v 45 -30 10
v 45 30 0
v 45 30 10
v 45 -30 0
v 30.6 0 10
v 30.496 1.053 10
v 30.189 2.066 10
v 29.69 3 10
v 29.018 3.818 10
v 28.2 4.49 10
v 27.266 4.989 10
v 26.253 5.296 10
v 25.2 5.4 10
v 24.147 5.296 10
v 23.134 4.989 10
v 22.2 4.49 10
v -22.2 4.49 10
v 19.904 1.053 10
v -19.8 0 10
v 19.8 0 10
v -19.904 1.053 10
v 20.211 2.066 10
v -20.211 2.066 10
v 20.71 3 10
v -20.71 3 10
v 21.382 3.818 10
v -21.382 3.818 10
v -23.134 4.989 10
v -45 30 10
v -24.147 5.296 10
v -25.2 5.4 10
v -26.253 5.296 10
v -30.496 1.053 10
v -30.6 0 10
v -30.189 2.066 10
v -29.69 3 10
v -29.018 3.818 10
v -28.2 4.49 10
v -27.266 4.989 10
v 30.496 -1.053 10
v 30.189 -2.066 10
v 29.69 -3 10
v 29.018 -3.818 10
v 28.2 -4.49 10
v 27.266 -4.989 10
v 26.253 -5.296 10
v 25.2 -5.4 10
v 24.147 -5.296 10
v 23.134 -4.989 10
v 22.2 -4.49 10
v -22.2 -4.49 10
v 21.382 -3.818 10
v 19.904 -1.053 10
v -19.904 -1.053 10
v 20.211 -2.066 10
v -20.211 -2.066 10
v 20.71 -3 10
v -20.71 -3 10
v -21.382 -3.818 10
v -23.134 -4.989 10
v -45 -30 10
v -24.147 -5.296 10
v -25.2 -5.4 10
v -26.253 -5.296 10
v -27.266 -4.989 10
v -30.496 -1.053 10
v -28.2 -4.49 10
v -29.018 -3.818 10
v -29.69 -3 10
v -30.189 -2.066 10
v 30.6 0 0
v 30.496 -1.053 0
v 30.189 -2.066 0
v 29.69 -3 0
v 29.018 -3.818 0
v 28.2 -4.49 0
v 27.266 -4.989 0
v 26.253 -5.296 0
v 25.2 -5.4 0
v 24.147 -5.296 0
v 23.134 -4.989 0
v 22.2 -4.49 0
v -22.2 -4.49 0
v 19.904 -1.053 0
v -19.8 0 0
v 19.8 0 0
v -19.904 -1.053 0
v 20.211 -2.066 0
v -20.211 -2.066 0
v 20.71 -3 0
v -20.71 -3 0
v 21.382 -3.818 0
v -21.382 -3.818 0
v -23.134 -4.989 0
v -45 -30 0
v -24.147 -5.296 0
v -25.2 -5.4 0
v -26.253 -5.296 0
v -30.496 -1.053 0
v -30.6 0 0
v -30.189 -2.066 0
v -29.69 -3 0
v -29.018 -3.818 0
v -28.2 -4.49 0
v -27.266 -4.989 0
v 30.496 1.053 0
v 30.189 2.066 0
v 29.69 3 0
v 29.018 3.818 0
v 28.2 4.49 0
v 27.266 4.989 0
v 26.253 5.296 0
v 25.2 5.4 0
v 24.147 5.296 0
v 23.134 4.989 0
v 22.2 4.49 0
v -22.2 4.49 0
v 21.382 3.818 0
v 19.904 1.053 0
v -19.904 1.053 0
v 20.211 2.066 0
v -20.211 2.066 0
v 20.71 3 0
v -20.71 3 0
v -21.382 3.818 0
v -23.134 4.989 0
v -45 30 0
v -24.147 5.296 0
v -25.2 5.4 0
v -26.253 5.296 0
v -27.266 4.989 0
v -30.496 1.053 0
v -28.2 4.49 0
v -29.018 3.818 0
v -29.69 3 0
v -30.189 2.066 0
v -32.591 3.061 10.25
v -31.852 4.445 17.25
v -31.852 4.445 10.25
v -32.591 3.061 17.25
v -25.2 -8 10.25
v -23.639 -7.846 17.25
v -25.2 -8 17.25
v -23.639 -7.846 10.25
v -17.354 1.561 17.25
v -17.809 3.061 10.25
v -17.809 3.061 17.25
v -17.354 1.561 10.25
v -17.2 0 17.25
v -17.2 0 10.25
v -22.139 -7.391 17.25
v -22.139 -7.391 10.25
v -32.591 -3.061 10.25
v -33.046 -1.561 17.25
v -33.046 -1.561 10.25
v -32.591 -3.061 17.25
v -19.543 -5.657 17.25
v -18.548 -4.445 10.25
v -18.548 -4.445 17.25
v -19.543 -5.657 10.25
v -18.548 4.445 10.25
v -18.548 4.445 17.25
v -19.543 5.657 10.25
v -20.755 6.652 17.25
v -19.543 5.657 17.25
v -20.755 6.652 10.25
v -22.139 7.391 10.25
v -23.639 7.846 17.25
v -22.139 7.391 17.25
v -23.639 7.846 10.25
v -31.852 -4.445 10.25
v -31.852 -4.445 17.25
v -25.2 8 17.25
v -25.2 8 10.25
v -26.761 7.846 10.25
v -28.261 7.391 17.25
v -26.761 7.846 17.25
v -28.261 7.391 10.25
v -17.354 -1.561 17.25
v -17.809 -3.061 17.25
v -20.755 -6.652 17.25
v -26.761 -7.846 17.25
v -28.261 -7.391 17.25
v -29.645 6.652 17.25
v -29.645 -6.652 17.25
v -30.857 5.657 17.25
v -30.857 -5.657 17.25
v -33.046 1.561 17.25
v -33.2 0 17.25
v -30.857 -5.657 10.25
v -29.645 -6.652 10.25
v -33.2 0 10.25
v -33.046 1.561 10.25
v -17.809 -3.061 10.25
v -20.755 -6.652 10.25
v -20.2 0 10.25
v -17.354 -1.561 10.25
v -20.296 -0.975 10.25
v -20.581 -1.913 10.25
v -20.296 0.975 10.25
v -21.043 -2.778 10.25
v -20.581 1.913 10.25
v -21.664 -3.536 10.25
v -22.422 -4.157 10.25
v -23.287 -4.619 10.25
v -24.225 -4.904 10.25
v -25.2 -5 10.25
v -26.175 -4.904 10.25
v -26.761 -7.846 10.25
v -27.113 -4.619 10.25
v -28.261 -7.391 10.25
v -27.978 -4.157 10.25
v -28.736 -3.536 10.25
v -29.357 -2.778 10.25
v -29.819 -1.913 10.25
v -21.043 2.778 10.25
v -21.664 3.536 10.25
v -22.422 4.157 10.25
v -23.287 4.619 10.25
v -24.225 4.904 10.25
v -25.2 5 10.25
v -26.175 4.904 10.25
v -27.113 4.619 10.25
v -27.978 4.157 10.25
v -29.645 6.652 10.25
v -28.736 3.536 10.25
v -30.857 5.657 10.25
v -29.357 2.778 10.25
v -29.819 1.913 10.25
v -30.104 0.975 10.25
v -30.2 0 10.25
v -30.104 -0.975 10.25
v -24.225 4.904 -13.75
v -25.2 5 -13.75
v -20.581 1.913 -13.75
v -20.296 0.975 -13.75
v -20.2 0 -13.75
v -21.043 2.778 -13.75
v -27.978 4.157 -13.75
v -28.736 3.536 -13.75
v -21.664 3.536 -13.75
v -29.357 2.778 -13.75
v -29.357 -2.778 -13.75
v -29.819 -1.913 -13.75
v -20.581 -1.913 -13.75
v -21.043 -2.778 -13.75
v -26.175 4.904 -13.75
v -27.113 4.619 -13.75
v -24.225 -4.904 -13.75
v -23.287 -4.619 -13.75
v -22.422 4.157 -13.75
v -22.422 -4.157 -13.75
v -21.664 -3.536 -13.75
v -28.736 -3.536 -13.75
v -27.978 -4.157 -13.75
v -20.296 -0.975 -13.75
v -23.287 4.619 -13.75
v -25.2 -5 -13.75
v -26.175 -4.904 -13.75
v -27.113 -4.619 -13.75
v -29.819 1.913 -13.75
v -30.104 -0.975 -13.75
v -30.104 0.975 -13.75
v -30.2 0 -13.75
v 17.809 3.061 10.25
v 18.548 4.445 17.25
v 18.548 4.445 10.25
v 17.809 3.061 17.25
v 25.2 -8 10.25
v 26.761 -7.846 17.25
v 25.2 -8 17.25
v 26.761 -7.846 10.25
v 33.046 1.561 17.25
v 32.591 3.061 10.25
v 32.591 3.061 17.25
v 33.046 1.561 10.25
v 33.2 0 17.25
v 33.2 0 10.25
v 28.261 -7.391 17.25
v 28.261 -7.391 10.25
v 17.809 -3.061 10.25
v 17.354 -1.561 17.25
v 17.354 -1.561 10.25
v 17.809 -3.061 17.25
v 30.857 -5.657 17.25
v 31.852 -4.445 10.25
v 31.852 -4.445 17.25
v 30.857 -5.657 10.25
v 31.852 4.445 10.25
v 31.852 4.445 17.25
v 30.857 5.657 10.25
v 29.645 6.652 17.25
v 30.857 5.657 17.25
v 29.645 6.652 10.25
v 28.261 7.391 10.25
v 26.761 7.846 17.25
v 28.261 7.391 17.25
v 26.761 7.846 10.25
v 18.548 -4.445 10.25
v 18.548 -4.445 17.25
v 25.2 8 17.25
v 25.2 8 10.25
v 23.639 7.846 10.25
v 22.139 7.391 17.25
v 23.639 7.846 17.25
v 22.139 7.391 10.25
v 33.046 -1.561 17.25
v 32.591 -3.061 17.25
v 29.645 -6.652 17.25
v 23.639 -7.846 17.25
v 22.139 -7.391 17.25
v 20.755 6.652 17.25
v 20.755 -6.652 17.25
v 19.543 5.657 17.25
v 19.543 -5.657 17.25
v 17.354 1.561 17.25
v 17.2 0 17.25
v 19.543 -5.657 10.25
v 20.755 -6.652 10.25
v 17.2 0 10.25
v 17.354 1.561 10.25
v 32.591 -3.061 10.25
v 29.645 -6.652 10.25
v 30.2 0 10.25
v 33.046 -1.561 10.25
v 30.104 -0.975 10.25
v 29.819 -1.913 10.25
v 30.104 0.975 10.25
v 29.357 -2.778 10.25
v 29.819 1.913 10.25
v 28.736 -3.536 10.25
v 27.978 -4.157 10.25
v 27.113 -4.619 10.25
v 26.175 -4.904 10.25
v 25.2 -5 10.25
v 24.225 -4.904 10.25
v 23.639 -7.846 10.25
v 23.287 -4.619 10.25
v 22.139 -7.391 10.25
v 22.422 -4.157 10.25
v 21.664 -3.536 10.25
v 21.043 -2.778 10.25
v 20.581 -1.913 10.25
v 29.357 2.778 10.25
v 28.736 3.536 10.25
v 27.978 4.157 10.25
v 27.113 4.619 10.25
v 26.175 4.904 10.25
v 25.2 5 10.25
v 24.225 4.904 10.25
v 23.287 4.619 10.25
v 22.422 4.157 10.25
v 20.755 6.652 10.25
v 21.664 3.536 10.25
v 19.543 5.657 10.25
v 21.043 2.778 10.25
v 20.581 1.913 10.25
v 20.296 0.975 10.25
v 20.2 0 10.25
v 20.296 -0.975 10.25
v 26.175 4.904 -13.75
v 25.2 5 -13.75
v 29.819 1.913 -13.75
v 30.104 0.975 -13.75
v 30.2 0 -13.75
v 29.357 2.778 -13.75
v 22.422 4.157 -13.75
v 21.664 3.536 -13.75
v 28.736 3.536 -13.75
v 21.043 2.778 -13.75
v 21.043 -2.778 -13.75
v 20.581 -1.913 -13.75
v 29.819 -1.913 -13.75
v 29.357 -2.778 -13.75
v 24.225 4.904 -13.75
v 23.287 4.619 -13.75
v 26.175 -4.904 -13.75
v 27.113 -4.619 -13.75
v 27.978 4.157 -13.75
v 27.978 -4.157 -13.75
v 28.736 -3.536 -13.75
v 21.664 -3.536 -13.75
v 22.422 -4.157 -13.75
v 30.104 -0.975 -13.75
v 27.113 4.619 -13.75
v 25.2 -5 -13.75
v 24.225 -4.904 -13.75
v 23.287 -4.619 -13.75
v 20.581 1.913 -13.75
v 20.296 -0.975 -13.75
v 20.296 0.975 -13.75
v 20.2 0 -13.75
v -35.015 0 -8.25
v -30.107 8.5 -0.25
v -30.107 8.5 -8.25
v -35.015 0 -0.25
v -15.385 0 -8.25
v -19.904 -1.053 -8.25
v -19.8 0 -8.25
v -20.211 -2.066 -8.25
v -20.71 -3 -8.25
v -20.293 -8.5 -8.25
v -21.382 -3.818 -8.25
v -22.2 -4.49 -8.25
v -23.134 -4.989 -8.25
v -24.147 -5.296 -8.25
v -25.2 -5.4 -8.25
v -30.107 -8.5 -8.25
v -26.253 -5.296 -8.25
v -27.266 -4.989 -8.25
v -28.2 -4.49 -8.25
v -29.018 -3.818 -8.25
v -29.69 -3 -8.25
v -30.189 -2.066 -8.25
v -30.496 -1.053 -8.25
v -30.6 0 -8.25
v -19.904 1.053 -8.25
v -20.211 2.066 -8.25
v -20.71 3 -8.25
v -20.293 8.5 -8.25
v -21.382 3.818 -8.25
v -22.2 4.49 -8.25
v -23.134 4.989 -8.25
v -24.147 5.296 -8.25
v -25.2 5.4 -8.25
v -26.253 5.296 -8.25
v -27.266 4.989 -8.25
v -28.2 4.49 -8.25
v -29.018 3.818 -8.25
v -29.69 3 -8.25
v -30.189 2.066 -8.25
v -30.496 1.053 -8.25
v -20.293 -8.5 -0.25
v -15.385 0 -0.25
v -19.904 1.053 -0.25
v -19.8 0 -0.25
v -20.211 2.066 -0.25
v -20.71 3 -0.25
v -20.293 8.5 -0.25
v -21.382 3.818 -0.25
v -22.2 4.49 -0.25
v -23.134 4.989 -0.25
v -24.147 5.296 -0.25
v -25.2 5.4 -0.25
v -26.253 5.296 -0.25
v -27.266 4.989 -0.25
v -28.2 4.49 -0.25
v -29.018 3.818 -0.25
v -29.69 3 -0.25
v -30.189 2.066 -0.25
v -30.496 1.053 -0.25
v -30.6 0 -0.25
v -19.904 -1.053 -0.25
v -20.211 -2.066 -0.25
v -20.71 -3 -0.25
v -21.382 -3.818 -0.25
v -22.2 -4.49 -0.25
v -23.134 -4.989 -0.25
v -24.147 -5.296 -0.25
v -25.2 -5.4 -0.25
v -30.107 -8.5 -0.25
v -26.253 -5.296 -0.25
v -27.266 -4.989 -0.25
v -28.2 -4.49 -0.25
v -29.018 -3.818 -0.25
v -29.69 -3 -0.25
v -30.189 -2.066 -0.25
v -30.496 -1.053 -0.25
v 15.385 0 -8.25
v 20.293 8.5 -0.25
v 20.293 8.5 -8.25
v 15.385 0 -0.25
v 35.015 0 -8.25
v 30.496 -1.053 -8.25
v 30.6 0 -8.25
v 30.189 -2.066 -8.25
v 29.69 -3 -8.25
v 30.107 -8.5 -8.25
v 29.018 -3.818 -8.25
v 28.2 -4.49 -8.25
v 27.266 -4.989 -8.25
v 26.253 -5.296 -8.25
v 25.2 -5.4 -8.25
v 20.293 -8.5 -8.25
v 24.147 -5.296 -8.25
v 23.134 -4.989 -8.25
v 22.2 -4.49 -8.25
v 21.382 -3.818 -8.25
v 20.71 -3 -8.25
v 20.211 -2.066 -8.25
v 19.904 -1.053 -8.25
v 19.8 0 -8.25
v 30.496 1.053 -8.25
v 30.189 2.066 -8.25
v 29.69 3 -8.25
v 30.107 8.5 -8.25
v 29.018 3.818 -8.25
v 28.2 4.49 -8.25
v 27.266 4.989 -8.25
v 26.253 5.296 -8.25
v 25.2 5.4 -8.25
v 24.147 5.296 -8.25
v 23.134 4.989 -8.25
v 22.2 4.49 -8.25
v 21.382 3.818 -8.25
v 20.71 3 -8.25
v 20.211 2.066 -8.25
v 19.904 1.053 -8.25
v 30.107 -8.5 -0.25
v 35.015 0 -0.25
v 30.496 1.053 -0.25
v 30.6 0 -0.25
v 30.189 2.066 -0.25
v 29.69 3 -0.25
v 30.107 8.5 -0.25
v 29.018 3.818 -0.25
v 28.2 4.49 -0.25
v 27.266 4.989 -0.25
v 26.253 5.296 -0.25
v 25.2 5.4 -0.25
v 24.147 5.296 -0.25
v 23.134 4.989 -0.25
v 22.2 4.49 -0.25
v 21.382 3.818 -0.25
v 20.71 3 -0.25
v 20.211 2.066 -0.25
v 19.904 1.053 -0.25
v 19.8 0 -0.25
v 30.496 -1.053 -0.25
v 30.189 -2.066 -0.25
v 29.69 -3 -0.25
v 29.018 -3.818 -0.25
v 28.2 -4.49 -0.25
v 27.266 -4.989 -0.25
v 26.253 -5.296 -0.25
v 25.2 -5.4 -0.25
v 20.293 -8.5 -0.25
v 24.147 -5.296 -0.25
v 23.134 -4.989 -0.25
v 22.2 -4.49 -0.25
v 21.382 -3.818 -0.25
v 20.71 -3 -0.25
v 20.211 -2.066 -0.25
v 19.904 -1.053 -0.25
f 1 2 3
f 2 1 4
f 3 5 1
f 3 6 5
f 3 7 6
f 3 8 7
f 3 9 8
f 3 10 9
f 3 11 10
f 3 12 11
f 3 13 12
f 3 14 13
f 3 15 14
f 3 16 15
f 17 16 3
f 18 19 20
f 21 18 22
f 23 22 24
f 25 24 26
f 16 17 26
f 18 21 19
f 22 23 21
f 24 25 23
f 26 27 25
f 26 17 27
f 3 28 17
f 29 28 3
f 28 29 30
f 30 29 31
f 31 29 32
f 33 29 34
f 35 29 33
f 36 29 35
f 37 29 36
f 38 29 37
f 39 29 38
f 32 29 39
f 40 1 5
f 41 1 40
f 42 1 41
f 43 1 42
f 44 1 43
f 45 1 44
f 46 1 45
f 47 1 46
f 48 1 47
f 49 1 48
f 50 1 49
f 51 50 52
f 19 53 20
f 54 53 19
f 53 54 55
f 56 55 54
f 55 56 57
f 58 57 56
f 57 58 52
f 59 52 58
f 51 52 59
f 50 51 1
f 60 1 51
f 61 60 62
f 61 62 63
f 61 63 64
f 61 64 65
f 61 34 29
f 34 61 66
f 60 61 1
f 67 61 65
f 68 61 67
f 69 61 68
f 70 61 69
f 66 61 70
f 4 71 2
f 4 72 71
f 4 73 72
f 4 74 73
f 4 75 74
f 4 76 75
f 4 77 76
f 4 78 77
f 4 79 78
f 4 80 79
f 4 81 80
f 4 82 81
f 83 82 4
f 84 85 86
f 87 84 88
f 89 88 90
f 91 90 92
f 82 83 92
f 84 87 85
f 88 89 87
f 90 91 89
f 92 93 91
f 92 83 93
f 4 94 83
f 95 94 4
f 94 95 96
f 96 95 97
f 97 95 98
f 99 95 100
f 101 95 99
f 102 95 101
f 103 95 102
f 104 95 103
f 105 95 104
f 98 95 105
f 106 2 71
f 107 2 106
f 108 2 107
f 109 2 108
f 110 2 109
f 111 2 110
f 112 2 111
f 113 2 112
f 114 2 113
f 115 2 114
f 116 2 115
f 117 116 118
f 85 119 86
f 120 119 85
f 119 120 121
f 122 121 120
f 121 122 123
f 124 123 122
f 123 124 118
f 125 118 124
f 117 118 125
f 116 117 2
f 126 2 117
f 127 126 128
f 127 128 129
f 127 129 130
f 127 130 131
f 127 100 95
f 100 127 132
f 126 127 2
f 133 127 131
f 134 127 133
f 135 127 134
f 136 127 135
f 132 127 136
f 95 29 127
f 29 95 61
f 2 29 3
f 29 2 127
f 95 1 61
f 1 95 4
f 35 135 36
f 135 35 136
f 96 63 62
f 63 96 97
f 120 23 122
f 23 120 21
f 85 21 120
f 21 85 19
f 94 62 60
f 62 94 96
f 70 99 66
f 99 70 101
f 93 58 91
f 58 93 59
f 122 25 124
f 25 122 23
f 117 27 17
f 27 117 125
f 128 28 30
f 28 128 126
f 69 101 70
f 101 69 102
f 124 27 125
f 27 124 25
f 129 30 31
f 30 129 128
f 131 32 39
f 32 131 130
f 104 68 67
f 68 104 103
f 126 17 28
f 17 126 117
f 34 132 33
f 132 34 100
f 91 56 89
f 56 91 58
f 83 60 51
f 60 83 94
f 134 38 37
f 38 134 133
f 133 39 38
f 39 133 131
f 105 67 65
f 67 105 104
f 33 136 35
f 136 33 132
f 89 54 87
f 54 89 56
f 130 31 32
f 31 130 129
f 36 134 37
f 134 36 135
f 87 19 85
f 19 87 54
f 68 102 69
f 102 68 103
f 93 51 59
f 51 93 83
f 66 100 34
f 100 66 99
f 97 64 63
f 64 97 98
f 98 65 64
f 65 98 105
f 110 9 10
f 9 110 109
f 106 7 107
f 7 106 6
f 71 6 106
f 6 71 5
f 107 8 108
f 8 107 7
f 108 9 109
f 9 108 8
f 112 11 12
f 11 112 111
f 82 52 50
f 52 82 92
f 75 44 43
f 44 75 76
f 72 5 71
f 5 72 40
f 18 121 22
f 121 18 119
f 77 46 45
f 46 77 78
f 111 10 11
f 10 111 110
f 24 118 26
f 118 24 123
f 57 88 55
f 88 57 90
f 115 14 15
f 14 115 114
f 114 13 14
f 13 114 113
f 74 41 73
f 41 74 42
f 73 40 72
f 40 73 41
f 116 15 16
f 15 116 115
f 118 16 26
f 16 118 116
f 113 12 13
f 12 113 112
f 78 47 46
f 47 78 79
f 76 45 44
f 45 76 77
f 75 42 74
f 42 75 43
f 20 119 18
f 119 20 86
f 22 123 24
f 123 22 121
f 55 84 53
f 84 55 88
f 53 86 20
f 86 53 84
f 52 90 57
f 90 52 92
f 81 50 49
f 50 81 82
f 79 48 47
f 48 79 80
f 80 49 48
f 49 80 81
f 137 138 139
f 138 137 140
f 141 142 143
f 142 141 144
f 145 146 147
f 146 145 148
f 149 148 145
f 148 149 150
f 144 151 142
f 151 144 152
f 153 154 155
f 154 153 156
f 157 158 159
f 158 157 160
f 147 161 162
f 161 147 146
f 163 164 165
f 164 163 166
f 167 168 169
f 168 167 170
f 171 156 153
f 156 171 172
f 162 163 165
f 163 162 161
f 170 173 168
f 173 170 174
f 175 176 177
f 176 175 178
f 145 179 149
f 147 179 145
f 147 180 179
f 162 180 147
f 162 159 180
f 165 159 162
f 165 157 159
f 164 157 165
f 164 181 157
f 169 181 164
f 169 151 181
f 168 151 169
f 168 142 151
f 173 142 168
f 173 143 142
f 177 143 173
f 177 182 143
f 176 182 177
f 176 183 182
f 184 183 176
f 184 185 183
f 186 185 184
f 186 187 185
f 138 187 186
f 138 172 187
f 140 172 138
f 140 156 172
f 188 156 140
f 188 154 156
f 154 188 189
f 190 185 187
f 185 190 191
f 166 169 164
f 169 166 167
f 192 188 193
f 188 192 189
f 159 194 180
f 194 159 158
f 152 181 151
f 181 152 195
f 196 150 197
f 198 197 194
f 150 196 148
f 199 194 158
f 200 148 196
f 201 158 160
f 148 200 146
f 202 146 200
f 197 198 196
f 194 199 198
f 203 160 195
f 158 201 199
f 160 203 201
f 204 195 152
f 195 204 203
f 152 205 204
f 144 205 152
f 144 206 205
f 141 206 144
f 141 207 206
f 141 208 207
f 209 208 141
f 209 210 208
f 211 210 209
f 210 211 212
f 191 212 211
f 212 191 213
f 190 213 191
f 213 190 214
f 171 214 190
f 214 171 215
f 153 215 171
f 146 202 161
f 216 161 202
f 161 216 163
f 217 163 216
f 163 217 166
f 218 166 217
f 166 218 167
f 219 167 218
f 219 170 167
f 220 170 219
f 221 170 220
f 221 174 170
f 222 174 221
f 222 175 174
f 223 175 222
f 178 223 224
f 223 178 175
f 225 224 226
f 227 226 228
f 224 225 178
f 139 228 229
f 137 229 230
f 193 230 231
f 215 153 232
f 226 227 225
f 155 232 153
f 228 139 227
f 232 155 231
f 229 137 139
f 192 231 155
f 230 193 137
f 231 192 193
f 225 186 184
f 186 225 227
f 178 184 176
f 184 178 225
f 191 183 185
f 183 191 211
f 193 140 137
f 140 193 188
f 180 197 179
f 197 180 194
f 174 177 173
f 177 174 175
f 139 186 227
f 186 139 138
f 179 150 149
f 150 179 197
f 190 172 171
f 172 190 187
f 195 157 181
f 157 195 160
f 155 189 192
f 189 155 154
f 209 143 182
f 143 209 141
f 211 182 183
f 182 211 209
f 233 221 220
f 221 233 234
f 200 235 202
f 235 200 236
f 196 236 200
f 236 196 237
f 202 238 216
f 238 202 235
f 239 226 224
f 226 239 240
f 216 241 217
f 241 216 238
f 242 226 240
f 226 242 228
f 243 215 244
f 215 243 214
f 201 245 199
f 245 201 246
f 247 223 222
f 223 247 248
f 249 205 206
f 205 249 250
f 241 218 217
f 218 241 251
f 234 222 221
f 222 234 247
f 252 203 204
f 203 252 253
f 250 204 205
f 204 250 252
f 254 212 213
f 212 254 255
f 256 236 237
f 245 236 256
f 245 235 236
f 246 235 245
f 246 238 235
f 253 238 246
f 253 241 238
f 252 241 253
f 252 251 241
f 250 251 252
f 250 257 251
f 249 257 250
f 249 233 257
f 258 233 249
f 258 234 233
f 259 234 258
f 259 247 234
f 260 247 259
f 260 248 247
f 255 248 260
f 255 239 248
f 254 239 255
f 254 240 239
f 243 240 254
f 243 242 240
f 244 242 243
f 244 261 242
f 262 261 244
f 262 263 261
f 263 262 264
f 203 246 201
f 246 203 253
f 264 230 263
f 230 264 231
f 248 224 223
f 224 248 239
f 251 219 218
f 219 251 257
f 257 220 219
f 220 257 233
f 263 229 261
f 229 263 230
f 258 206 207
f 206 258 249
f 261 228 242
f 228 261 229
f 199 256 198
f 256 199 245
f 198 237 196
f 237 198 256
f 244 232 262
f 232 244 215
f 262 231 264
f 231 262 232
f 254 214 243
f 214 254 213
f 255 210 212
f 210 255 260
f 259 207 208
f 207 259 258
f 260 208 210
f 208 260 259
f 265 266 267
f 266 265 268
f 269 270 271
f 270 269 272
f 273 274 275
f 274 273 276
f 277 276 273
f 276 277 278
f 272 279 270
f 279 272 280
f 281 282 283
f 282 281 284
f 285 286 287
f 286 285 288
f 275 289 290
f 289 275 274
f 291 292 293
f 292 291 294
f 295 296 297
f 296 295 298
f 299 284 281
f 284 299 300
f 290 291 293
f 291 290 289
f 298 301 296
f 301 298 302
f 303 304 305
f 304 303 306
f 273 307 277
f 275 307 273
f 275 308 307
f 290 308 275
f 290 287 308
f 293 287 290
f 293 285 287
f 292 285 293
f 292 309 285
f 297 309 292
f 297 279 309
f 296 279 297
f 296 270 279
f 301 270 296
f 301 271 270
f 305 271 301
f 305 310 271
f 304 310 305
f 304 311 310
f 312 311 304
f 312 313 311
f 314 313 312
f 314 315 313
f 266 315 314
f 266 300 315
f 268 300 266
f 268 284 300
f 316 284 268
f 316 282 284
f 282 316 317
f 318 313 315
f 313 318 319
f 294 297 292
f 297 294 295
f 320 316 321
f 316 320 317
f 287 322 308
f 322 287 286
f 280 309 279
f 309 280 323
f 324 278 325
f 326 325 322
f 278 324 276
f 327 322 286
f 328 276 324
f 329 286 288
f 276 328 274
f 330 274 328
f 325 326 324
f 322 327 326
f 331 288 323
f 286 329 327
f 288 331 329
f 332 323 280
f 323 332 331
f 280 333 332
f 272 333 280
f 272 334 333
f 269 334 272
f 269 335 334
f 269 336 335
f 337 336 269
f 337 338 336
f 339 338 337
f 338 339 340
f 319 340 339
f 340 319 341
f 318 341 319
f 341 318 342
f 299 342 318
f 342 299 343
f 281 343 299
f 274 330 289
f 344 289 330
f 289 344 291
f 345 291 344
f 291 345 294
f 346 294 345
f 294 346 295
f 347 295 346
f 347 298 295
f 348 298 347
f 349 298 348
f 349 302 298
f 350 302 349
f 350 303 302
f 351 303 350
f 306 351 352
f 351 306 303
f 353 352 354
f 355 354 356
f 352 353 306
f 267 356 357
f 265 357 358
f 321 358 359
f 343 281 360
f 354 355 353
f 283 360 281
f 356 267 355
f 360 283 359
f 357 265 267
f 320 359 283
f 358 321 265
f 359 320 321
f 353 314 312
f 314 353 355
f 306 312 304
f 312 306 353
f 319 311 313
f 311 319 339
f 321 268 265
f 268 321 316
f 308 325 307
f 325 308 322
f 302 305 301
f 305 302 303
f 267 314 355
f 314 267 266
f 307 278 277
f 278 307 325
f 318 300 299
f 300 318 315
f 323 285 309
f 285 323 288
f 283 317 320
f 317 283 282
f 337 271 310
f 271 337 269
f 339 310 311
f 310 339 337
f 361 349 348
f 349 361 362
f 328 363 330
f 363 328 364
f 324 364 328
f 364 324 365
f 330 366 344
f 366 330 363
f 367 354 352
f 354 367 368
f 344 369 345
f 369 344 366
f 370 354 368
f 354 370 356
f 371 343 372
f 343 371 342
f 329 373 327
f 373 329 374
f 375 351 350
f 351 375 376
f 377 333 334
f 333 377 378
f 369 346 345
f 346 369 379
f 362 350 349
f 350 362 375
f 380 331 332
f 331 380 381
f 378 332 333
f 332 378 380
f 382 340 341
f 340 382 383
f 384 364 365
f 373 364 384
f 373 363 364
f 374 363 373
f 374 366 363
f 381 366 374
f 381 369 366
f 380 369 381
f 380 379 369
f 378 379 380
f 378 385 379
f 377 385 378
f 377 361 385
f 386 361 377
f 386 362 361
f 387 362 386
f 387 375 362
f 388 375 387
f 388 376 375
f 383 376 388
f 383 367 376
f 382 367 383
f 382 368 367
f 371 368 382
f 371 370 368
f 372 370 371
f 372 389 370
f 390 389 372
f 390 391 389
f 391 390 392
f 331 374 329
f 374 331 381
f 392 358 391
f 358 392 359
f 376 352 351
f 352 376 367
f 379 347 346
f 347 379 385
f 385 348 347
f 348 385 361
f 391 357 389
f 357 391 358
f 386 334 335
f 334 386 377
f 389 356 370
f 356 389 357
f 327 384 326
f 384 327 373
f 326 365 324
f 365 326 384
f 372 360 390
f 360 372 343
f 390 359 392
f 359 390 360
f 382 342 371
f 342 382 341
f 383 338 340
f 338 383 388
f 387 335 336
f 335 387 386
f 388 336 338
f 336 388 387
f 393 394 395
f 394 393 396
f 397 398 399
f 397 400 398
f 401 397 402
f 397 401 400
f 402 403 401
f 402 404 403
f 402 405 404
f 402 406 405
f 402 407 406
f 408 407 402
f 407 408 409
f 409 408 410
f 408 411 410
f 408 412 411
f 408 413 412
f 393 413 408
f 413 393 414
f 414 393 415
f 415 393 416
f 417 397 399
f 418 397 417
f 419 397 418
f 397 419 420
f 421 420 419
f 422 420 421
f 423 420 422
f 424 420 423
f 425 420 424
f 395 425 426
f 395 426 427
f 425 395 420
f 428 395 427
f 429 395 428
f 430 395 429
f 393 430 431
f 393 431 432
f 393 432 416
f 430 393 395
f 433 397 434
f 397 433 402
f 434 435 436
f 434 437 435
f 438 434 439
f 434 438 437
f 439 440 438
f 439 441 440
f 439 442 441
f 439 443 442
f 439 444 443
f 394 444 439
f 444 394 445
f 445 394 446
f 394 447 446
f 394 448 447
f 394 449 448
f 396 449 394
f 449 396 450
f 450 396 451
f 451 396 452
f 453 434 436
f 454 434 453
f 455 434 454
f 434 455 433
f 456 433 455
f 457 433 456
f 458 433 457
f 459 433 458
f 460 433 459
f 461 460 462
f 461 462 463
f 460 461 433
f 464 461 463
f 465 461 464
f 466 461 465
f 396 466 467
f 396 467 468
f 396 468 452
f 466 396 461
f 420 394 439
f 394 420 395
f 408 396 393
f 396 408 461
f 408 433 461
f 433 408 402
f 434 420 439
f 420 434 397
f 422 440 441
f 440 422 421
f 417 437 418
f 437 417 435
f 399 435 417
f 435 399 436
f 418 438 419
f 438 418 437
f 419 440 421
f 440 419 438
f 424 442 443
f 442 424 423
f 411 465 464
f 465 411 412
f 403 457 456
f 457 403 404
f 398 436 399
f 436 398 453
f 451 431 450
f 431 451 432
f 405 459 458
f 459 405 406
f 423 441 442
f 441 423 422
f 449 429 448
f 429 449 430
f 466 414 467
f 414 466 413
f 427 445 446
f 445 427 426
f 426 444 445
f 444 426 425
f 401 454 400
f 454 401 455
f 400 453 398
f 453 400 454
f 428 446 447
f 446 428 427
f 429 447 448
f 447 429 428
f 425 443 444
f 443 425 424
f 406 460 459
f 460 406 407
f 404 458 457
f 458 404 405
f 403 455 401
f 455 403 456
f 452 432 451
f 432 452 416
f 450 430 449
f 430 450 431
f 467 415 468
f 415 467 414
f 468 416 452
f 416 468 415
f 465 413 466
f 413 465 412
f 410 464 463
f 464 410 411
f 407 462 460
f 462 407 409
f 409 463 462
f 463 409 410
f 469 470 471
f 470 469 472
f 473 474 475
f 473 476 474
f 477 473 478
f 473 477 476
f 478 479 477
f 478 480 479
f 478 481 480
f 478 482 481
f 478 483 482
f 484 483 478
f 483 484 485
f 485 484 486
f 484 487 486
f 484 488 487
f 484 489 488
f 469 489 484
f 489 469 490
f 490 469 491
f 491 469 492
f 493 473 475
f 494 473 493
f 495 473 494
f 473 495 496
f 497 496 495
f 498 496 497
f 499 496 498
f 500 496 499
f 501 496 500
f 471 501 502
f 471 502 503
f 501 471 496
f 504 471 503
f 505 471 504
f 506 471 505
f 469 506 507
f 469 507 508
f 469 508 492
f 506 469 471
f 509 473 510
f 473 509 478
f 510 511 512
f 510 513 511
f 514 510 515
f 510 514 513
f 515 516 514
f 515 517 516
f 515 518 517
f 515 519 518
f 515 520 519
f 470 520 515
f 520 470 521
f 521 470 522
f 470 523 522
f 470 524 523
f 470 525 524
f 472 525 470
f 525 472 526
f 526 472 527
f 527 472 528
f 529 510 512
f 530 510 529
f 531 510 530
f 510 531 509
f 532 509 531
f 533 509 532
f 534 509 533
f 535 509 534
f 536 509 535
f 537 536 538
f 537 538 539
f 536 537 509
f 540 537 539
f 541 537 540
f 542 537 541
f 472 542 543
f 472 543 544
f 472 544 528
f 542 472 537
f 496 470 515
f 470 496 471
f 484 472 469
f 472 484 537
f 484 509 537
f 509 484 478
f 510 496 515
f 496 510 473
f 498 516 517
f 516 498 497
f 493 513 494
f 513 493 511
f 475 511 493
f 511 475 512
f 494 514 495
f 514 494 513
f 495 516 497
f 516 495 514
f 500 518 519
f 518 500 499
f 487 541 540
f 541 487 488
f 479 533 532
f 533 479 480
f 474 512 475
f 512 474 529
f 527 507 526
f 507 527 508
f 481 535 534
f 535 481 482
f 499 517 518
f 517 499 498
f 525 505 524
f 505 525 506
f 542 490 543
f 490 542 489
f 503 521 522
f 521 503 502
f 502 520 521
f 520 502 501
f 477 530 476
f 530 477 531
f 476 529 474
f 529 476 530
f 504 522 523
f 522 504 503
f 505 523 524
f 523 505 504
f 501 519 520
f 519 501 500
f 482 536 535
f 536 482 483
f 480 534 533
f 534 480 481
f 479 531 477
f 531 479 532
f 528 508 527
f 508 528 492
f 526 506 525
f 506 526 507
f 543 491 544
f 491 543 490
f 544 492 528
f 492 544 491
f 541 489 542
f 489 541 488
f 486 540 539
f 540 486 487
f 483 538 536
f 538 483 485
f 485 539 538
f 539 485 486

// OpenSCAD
$fn = 32;

// ------------------------------------------------------------------------
// Bolted plate: 90 x 60 x 10 mm plate, 2 fasteners
// Every part is its own module, assembly() places them once.
// ------------------------------------------------------------------------

// --- part 1 ---
module plate() {
  difference() {
    translate([-45, -30, 0]) cube([90, 60, 10]);
    translate([-25.2, 0, -1]) cylinder(h = 12, d = 10.8);
    translate([25.2, 0, -1]) cylinder(h = 12, d = 10.8);
  }
}

// --- part 2 ---
module bolt1() {
  cylinder(h = 7, d = 16);
  translate([0, 0, -24]) cylinder(h = 24, d = 10);
}

// --- part 3 ---
module bolt2() {
  cylinder(h = 7, d = 16);
  translate([0, 0, -24]) cylinder(h = 24, d = 10);
}

// --- part 4 ---
module nut1() {
  difference() {
    linear_extrude(height = 8) polygon(points = [[9.815, 0], [4.907, 8.5], [-4.907, 8.5], [-9.815, 0], [-4.907, -8.5], [4.907, -8.5]]);
    translate([0, 0, -1]) cylinder(h = 10, d = 10.8);
  }
}

// --- part 5 ---
module nut2() {
  difference() {
    linear_extrude(height = 8) polygon(points = [[9.815, 0], [4.907, 8.5], [-4.907, 8.5], [-9.815, 0], [-4.907, -8.5], [4.907, -8.5]]);
    translate([0, 0, -1]) cylinder(h = 10, d = 10.8);
  }
}

// --- assembly ---
module assembly() {
  translate([0, 0, 0]) rotate([0, 0, 0]) plate();
  translate([-25.2, 0, 10.25]) rotate([0, 0, 0]) bolt1();
  translate([25.2, 0, 10.25]) rotate([0, 0, 0]) bolt2();
  translate([-25.2, 0, -8.25]) rotate([0, 0, 0]) nut1();
  translate([25.2, 0, -8.25]) rotate([0, 0, 0]) nut2();
}

assembly();
